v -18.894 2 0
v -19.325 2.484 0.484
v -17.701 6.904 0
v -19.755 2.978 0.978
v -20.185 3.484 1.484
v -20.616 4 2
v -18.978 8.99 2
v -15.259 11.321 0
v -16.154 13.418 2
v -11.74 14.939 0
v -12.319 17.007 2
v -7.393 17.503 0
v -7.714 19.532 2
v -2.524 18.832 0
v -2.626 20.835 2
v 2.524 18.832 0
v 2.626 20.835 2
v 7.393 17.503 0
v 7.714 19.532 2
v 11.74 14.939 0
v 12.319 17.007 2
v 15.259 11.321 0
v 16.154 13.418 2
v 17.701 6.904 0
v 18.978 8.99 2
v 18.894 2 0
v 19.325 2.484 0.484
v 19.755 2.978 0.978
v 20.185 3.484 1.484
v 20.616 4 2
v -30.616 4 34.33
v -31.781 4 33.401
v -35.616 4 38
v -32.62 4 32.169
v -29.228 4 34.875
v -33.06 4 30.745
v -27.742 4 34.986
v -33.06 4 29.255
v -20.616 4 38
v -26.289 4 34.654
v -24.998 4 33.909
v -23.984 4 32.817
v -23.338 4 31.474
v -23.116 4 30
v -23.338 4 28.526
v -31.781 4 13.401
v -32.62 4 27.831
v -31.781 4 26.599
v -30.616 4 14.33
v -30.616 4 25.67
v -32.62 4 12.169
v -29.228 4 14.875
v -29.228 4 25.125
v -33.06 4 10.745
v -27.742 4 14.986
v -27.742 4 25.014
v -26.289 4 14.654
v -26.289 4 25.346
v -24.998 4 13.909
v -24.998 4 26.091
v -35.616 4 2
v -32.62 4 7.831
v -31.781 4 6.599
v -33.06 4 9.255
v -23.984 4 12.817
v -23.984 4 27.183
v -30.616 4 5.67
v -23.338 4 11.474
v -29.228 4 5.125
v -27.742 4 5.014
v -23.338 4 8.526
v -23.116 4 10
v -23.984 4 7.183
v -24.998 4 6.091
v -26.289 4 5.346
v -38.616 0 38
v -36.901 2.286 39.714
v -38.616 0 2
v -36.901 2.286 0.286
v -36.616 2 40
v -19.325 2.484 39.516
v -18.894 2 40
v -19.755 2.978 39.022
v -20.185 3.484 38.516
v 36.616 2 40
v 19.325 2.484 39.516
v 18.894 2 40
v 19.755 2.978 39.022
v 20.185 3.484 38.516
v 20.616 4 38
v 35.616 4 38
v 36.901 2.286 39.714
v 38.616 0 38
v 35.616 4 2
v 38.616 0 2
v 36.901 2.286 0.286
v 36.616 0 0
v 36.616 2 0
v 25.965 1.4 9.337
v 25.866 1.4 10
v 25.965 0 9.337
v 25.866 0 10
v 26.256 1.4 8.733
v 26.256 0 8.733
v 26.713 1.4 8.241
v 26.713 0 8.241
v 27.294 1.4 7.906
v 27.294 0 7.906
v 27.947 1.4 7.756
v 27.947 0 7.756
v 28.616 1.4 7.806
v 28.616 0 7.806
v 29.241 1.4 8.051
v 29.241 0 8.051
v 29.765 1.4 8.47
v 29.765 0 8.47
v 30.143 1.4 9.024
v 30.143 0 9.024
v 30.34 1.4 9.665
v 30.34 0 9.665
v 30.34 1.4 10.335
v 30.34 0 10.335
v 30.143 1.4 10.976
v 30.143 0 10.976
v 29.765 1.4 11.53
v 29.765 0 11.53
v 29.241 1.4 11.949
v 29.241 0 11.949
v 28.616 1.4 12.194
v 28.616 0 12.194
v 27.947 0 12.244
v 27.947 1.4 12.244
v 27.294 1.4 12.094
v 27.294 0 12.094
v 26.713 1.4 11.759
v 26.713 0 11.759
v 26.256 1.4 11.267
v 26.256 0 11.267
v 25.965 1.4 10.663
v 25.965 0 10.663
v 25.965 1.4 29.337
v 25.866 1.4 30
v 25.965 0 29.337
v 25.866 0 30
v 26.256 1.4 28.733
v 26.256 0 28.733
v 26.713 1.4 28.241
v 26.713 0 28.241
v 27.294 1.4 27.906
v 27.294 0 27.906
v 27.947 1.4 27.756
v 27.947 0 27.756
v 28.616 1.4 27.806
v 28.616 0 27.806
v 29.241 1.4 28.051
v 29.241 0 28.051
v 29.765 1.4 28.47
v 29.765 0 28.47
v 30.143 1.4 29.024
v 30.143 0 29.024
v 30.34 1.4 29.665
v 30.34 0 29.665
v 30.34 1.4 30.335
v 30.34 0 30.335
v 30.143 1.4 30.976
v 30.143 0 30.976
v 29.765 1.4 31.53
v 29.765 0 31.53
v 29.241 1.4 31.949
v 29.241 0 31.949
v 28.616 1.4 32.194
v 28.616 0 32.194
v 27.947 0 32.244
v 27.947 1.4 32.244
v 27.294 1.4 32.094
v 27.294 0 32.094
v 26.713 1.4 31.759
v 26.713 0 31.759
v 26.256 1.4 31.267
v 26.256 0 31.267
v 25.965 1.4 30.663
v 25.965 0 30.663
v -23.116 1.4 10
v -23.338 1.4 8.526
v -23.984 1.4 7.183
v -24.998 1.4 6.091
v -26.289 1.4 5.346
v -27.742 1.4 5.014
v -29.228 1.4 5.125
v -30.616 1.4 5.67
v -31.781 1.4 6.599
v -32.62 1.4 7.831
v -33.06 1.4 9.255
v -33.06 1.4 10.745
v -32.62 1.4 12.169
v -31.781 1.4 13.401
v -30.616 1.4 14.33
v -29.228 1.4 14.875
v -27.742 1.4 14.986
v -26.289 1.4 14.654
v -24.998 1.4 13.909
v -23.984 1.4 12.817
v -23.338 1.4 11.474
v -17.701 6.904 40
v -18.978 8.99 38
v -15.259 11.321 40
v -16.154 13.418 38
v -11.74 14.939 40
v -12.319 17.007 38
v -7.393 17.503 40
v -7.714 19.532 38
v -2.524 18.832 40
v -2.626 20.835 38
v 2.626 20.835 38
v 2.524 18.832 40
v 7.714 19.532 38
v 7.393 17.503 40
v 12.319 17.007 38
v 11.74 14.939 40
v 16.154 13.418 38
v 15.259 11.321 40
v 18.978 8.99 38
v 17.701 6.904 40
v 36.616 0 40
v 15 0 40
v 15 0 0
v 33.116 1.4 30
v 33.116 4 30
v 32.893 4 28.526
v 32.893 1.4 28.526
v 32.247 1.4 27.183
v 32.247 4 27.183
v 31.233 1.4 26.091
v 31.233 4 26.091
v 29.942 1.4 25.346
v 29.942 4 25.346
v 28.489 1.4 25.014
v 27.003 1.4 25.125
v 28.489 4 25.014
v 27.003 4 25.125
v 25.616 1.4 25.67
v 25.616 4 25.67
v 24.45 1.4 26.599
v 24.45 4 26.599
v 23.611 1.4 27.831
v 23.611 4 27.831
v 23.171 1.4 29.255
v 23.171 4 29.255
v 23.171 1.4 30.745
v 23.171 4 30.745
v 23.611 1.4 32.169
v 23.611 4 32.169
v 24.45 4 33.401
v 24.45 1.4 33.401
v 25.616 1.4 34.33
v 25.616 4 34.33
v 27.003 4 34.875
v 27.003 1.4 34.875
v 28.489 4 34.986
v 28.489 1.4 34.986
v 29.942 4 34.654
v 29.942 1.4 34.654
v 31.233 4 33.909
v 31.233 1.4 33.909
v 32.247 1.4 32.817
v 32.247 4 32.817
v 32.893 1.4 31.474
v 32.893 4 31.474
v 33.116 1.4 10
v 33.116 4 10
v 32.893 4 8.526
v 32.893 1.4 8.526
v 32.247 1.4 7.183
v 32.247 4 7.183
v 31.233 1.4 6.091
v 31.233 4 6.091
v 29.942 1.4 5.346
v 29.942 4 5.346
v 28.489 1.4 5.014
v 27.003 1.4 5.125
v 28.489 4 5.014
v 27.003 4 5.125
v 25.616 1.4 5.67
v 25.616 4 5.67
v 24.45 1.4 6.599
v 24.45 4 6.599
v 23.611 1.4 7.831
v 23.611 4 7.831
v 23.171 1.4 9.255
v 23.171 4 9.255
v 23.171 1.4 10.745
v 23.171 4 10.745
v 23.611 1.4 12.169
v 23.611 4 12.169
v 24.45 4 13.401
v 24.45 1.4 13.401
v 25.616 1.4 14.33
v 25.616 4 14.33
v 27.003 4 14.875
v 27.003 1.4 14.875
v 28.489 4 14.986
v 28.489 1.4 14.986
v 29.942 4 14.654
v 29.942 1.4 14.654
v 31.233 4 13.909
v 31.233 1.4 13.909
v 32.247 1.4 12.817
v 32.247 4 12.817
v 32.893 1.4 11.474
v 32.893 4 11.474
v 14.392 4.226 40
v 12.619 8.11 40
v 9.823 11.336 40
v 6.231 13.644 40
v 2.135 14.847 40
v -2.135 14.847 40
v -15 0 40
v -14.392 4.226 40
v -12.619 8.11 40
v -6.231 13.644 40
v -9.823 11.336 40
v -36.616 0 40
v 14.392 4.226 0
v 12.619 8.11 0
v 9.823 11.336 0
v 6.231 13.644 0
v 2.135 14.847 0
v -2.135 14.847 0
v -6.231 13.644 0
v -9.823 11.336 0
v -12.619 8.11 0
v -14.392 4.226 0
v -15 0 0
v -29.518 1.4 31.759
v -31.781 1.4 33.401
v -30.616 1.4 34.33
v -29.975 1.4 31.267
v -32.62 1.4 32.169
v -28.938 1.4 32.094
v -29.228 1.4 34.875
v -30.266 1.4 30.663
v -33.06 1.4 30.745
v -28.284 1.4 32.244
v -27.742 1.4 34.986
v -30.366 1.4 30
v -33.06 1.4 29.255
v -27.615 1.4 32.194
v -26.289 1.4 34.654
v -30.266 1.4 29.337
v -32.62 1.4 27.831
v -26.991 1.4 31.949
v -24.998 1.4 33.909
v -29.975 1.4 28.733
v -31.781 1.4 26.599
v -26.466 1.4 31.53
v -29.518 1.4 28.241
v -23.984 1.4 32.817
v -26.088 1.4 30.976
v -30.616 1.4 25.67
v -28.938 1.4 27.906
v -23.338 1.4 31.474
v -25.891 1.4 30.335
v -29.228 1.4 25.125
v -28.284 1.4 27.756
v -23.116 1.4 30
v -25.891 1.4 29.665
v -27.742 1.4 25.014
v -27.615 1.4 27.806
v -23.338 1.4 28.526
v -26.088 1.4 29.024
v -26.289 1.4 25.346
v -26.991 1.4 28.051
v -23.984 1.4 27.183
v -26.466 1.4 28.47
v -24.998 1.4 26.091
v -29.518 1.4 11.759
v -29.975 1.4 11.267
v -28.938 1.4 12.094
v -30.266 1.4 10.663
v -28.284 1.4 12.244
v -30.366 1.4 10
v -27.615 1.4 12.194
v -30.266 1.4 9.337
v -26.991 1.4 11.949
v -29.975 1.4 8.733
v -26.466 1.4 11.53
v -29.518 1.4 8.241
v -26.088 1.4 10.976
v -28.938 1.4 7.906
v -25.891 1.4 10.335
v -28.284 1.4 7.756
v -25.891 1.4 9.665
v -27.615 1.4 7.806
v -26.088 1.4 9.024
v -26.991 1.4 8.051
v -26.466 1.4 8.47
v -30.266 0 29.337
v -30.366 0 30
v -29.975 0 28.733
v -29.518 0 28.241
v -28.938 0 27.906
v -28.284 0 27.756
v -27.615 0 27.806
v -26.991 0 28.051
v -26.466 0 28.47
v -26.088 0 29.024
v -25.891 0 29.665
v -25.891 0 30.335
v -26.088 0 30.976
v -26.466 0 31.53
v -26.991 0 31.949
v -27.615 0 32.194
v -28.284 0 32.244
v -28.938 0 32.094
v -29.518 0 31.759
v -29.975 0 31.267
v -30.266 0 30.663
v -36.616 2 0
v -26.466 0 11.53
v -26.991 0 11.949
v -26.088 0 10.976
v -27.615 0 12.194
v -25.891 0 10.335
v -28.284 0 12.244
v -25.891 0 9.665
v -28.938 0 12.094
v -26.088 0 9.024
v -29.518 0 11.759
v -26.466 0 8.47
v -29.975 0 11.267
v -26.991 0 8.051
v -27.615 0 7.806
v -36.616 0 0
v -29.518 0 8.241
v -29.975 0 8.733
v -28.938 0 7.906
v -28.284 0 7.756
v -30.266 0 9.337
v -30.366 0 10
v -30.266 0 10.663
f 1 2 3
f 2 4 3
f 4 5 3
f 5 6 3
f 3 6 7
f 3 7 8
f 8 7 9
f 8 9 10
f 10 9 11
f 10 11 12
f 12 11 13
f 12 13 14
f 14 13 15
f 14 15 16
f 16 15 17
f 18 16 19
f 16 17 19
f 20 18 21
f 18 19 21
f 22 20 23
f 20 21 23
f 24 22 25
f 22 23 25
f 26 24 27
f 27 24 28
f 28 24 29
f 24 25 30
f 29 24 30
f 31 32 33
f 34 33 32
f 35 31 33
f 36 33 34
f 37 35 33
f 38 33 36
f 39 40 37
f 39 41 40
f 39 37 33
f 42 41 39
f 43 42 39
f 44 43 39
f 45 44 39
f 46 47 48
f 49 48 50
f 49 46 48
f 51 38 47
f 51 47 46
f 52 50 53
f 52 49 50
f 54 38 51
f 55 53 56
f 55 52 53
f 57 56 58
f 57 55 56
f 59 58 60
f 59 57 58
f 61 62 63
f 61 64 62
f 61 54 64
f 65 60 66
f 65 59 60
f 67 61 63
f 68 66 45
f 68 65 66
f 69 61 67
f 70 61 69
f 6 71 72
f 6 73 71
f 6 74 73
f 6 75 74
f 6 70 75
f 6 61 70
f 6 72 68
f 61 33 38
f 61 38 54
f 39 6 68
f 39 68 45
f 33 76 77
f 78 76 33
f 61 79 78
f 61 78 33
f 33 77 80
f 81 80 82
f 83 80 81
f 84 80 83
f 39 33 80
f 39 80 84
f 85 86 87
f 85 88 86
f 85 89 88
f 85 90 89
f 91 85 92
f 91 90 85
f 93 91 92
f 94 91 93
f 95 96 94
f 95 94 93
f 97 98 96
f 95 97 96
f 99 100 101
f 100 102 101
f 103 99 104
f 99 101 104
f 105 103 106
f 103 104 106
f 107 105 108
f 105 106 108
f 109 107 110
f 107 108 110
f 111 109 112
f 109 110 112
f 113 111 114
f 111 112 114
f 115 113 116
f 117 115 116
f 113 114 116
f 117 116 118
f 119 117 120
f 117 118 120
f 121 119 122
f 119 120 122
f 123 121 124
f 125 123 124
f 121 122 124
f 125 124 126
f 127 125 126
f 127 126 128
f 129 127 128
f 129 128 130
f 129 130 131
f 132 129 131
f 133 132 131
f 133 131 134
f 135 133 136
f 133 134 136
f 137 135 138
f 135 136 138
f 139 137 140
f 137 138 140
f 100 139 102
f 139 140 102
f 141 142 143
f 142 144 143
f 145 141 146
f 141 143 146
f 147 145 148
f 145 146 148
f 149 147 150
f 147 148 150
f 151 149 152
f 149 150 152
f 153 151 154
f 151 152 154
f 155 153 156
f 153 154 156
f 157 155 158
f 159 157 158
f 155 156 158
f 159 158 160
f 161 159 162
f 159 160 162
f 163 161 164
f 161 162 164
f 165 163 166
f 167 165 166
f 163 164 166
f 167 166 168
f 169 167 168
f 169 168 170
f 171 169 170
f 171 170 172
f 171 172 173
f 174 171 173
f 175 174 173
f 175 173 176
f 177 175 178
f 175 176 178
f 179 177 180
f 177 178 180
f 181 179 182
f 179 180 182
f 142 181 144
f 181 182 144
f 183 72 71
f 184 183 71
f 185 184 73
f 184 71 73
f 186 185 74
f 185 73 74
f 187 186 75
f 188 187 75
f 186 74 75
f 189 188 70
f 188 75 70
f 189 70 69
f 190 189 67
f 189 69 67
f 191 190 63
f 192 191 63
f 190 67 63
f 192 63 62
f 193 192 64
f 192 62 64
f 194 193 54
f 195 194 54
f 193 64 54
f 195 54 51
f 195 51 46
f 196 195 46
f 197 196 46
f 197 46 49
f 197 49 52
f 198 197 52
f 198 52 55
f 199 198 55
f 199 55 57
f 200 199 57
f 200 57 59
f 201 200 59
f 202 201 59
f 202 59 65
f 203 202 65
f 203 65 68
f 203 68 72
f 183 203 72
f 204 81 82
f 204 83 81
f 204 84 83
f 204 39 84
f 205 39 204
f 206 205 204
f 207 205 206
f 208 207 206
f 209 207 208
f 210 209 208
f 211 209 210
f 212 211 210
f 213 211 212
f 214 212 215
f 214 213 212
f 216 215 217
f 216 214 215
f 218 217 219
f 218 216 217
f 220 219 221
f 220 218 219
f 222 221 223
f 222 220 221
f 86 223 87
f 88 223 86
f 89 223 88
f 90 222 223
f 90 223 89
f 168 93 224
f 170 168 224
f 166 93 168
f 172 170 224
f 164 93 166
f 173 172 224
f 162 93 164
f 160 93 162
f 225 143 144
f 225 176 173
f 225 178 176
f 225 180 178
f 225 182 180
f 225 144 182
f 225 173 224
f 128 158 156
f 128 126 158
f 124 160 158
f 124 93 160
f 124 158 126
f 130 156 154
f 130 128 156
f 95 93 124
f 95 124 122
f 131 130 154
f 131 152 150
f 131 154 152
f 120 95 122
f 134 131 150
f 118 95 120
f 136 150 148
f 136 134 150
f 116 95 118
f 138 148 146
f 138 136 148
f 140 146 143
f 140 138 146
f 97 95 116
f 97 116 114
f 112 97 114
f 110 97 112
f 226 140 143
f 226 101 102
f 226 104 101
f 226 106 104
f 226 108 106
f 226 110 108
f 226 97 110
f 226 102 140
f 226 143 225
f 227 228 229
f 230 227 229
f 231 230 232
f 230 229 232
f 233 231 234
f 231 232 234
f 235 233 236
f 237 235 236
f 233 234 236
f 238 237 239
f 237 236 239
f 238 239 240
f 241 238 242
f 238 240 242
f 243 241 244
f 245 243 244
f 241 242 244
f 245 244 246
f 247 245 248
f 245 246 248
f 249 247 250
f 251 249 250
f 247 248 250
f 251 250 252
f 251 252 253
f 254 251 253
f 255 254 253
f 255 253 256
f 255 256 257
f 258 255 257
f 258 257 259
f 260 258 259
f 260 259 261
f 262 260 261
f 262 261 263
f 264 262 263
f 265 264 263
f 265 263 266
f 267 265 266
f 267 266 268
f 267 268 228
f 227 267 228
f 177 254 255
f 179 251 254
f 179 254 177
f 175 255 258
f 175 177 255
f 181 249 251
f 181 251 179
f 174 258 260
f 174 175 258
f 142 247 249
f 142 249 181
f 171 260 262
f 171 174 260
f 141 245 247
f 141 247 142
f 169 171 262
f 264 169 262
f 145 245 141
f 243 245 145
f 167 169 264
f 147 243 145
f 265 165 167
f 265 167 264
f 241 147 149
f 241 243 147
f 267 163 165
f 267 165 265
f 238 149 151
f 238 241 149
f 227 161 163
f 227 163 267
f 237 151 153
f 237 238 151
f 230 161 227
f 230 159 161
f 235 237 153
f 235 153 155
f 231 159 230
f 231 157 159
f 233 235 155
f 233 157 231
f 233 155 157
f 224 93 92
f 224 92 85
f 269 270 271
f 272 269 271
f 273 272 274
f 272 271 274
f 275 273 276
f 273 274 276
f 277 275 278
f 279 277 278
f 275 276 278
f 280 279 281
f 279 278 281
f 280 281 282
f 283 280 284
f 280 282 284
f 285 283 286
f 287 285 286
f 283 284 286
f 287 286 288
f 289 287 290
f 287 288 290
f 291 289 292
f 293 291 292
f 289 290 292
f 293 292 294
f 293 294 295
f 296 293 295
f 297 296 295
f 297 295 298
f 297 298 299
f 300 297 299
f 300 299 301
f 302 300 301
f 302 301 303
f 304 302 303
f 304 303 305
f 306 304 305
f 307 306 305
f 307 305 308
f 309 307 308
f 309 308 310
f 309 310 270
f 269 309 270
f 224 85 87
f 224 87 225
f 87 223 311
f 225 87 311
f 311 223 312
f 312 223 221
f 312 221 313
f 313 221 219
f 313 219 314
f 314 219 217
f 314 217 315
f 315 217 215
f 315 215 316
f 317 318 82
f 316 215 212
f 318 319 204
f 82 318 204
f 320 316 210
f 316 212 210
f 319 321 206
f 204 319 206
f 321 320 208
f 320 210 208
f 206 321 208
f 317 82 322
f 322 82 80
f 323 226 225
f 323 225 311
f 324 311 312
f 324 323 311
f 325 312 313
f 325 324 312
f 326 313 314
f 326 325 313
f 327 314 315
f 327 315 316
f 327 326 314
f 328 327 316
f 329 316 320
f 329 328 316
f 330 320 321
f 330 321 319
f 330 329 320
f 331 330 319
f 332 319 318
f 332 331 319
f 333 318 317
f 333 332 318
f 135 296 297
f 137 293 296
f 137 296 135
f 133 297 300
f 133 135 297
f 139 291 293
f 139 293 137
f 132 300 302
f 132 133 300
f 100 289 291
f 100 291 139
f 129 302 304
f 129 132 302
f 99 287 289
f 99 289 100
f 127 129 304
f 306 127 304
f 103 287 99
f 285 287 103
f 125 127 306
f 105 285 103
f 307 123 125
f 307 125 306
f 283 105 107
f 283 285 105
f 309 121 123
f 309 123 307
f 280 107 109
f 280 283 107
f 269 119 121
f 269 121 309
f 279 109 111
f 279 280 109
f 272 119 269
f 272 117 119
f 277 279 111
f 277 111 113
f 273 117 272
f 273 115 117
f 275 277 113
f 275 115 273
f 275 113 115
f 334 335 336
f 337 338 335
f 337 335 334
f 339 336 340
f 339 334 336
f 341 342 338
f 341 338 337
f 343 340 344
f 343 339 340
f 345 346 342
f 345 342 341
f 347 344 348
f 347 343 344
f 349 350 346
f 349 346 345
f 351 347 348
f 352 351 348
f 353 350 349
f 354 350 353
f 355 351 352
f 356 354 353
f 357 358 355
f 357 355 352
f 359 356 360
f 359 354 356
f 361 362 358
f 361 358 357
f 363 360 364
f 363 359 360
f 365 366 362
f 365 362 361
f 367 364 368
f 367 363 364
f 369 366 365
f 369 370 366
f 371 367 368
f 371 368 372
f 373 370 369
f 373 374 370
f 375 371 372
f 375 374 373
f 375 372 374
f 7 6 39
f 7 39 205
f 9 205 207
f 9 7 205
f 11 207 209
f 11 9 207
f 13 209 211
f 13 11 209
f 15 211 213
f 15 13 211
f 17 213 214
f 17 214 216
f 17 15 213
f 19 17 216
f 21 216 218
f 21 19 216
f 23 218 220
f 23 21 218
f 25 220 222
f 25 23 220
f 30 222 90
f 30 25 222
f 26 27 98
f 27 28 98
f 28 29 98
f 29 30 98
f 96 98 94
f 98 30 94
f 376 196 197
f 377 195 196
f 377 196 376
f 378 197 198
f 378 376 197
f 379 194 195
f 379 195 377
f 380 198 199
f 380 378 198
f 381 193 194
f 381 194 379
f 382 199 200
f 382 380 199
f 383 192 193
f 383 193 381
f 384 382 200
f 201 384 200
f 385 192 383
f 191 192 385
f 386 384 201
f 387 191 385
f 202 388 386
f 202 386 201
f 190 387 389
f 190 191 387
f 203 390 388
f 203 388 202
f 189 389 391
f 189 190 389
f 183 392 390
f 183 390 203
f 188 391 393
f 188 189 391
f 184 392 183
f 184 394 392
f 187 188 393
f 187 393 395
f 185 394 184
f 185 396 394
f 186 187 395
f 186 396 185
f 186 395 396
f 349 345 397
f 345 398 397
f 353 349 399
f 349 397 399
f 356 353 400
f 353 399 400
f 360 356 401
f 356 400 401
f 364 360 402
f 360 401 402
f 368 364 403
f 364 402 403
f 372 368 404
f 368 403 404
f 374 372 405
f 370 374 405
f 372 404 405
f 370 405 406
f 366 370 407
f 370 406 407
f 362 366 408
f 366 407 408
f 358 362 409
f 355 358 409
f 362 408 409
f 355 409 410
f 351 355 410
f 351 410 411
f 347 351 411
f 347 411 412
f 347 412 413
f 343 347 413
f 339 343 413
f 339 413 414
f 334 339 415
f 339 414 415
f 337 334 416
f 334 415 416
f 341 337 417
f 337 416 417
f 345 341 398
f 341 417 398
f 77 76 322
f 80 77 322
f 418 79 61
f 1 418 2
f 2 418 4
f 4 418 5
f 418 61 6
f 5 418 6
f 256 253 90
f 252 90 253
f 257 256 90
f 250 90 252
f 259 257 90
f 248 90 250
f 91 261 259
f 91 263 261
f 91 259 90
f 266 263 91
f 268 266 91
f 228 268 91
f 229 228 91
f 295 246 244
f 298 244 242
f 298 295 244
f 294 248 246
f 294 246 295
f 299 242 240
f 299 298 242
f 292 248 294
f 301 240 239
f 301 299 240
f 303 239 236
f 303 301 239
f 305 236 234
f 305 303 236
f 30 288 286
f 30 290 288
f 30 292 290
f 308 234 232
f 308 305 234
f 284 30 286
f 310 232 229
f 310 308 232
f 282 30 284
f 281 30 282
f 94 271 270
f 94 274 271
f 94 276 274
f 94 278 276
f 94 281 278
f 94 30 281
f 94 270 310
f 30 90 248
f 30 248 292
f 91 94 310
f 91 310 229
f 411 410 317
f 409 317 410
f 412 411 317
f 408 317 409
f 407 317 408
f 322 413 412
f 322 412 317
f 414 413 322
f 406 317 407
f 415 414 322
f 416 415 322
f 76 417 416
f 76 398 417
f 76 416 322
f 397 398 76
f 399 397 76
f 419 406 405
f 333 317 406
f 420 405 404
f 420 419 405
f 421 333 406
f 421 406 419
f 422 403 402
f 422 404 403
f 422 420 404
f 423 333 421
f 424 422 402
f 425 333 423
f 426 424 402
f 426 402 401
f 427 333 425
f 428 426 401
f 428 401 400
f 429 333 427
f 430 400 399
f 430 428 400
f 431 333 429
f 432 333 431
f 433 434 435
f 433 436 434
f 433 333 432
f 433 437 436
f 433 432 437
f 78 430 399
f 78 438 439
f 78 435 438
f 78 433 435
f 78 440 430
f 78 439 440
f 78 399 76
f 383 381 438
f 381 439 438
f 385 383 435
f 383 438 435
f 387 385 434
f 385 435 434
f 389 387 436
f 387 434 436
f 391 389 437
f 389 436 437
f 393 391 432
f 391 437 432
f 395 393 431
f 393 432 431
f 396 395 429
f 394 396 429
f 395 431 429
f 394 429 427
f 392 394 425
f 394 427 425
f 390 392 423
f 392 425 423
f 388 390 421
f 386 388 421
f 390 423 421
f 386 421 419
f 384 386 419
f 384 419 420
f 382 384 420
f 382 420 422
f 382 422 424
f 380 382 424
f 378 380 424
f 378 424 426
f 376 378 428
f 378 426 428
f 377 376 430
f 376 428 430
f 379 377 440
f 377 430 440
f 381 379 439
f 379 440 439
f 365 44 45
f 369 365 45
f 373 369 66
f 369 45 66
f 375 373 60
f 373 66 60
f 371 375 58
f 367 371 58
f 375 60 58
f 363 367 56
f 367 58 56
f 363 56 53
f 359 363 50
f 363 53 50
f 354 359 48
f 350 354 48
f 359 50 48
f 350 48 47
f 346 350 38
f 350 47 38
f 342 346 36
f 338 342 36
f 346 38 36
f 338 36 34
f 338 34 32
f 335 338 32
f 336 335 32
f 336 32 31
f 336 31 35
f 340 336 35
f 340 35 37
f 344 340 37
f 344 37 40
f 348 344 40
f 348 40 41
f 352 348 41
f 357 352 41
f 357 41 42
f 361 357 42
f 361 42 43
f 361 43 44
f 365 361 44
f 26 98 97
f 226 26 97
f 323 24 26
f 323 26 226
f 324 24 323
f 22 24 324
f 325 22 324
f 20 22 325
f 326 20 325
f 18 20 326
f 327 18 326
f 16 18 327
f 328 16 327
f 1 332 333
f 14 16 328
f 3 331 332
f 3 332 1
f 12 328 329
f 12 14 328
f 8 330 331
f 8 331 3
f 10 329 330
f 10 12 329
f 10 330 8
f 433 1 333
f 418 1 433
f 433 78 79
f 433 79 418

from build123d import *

# Parameters (mm, degrees)
ESTRUSIONE_ESTRUSIONE1_DEPTH                         = 40
FORO_LAMATO_PER_VITE_M4_A_TESTA_CILINDRI_D           = 4.5
FORO_LAMATO_PER_VITE_M4_A_TESTA_CILINDRI_DEPTH       = 80
FORO_LAMATO_PER_VITE_M4_A_TESTA_CILINDRI_CBORE_D     = 10
FORO_LAMATO_PER_VITE_M4_A_TESTA_CILINDRI_CBORE_DEPTH = 2.6
FORO_LAMATO_PER_VITE_M4_A_TESTA_CILINDRI_TIP         = 1.351936393
SMUSSO1_SIZE                                         = 2
TAGLIO_ESTRUSIONE1_DEPTH                             = 10


with BuildPart() as part:
    # Schizzo1 → Estrusione-Estrusione1 (new body)
    with BuildSketch(Plane.XY):
        with BuildLine():
            Line((-15, 0), (-38.615528128, 0))
            Line((-38.615528128, 0), (-35.615528128, 4))
            Line((-35.615528128, 4), (-20.615528128, 4))
            ThreePointArc((-20.615528128, 4), (0, 21), (20.615528128, 4))
            Line((20.615528128, 4), (35.615528128, 4))
            Line((35.615528128, 4), (38.615528128, 0))
            Line((38.615528128, 0), (15, 0))
            ThreePointArc((15, 0), (0, 15), (-15, 0))
        make_face()
    extrude(amount=ESTRUSIONE_ESTRUSIONE1_DEPTH)

    # Foro lamato per Vite M4 a testa cilindrica-1
    with Locations(Plane(origin=(0, 4, 0), x_dir=(1, 0, 0), z_dir=(0, 1, 0))):
        with Locations((-28.115528128, -10), (-28.115528128, -30), (28.115528128, -30), (28.115528128, -10)):
            CounterBoreHole(FORO_LAMATO_PER_VITE_M4_A_TESTA_CILINDRI_D / 2, FORO_LAMATO_PER_VITE_M4_A_TESTA_CILINDRI_CBORE_D / 2, FORO_LAMATO_PER_VITE_M4_A_TESTA_CILINDRI_CBORE_DEPTH, depth=FORO_LAMATO_PER_VITE_M4_A_TESTA_CILINDRI_DEPTH)
            with Locations((0, 0, -(FORO_LAMATO_PER_VITE_M4_A_TESTA_CILINDRI_DEPTH + FORO_LAMATO_PER_VITE_M4_A_TESTA_CILINDRI_TIP / 2))):  # 118° drill point
                Cone(0, FORO_LAMATO_PER_VITE_M4_A_TESTA_CILINDRI_D / 2, FORO_LAMATO_PER_VITE_M4_A_TESTA_CILINDRI_TIP, mode=Mode.SUBTRACT)

    # Smusso1
    smusso1_edges = [part.edges().sort_by_distance(p)[0] for p in [
        (28.115528128, 4, 0),
        (28.115528128, 4, 40),
        (0, 21, 40),
        (-28.115528128, 4, 40),
        (-28.115528128, 4, 0),
        (0, 21, 0),
    ]]
    chamfer(smusso1_edges, length=SMUSSO1_SIZE)

    # Schizzo4 → Taglio-Estrusione1 (cut)
    with BuildSketch(Plane.XZ):
        Polygon((-38.615528128, 38), (-36.615528128, 40), (-38.615528128, 40), align=None)
        Polygon((-38.615528128, 2), (-36.615528128, 0), (-38.615528128, 0), align=None)
        Polygon((36.615528128, 0), (38.615528128, 2), (38.615528128, 0), align=None)
        Polygon((36.615528128, 40), (38.615528128, 40), (38.615528128, 38), align=None)
    extrude(amount=-TAGLIO_ESTRUSIONE1_DEPTH, mode=Mode.SUBTRACT)


solid = part.part
